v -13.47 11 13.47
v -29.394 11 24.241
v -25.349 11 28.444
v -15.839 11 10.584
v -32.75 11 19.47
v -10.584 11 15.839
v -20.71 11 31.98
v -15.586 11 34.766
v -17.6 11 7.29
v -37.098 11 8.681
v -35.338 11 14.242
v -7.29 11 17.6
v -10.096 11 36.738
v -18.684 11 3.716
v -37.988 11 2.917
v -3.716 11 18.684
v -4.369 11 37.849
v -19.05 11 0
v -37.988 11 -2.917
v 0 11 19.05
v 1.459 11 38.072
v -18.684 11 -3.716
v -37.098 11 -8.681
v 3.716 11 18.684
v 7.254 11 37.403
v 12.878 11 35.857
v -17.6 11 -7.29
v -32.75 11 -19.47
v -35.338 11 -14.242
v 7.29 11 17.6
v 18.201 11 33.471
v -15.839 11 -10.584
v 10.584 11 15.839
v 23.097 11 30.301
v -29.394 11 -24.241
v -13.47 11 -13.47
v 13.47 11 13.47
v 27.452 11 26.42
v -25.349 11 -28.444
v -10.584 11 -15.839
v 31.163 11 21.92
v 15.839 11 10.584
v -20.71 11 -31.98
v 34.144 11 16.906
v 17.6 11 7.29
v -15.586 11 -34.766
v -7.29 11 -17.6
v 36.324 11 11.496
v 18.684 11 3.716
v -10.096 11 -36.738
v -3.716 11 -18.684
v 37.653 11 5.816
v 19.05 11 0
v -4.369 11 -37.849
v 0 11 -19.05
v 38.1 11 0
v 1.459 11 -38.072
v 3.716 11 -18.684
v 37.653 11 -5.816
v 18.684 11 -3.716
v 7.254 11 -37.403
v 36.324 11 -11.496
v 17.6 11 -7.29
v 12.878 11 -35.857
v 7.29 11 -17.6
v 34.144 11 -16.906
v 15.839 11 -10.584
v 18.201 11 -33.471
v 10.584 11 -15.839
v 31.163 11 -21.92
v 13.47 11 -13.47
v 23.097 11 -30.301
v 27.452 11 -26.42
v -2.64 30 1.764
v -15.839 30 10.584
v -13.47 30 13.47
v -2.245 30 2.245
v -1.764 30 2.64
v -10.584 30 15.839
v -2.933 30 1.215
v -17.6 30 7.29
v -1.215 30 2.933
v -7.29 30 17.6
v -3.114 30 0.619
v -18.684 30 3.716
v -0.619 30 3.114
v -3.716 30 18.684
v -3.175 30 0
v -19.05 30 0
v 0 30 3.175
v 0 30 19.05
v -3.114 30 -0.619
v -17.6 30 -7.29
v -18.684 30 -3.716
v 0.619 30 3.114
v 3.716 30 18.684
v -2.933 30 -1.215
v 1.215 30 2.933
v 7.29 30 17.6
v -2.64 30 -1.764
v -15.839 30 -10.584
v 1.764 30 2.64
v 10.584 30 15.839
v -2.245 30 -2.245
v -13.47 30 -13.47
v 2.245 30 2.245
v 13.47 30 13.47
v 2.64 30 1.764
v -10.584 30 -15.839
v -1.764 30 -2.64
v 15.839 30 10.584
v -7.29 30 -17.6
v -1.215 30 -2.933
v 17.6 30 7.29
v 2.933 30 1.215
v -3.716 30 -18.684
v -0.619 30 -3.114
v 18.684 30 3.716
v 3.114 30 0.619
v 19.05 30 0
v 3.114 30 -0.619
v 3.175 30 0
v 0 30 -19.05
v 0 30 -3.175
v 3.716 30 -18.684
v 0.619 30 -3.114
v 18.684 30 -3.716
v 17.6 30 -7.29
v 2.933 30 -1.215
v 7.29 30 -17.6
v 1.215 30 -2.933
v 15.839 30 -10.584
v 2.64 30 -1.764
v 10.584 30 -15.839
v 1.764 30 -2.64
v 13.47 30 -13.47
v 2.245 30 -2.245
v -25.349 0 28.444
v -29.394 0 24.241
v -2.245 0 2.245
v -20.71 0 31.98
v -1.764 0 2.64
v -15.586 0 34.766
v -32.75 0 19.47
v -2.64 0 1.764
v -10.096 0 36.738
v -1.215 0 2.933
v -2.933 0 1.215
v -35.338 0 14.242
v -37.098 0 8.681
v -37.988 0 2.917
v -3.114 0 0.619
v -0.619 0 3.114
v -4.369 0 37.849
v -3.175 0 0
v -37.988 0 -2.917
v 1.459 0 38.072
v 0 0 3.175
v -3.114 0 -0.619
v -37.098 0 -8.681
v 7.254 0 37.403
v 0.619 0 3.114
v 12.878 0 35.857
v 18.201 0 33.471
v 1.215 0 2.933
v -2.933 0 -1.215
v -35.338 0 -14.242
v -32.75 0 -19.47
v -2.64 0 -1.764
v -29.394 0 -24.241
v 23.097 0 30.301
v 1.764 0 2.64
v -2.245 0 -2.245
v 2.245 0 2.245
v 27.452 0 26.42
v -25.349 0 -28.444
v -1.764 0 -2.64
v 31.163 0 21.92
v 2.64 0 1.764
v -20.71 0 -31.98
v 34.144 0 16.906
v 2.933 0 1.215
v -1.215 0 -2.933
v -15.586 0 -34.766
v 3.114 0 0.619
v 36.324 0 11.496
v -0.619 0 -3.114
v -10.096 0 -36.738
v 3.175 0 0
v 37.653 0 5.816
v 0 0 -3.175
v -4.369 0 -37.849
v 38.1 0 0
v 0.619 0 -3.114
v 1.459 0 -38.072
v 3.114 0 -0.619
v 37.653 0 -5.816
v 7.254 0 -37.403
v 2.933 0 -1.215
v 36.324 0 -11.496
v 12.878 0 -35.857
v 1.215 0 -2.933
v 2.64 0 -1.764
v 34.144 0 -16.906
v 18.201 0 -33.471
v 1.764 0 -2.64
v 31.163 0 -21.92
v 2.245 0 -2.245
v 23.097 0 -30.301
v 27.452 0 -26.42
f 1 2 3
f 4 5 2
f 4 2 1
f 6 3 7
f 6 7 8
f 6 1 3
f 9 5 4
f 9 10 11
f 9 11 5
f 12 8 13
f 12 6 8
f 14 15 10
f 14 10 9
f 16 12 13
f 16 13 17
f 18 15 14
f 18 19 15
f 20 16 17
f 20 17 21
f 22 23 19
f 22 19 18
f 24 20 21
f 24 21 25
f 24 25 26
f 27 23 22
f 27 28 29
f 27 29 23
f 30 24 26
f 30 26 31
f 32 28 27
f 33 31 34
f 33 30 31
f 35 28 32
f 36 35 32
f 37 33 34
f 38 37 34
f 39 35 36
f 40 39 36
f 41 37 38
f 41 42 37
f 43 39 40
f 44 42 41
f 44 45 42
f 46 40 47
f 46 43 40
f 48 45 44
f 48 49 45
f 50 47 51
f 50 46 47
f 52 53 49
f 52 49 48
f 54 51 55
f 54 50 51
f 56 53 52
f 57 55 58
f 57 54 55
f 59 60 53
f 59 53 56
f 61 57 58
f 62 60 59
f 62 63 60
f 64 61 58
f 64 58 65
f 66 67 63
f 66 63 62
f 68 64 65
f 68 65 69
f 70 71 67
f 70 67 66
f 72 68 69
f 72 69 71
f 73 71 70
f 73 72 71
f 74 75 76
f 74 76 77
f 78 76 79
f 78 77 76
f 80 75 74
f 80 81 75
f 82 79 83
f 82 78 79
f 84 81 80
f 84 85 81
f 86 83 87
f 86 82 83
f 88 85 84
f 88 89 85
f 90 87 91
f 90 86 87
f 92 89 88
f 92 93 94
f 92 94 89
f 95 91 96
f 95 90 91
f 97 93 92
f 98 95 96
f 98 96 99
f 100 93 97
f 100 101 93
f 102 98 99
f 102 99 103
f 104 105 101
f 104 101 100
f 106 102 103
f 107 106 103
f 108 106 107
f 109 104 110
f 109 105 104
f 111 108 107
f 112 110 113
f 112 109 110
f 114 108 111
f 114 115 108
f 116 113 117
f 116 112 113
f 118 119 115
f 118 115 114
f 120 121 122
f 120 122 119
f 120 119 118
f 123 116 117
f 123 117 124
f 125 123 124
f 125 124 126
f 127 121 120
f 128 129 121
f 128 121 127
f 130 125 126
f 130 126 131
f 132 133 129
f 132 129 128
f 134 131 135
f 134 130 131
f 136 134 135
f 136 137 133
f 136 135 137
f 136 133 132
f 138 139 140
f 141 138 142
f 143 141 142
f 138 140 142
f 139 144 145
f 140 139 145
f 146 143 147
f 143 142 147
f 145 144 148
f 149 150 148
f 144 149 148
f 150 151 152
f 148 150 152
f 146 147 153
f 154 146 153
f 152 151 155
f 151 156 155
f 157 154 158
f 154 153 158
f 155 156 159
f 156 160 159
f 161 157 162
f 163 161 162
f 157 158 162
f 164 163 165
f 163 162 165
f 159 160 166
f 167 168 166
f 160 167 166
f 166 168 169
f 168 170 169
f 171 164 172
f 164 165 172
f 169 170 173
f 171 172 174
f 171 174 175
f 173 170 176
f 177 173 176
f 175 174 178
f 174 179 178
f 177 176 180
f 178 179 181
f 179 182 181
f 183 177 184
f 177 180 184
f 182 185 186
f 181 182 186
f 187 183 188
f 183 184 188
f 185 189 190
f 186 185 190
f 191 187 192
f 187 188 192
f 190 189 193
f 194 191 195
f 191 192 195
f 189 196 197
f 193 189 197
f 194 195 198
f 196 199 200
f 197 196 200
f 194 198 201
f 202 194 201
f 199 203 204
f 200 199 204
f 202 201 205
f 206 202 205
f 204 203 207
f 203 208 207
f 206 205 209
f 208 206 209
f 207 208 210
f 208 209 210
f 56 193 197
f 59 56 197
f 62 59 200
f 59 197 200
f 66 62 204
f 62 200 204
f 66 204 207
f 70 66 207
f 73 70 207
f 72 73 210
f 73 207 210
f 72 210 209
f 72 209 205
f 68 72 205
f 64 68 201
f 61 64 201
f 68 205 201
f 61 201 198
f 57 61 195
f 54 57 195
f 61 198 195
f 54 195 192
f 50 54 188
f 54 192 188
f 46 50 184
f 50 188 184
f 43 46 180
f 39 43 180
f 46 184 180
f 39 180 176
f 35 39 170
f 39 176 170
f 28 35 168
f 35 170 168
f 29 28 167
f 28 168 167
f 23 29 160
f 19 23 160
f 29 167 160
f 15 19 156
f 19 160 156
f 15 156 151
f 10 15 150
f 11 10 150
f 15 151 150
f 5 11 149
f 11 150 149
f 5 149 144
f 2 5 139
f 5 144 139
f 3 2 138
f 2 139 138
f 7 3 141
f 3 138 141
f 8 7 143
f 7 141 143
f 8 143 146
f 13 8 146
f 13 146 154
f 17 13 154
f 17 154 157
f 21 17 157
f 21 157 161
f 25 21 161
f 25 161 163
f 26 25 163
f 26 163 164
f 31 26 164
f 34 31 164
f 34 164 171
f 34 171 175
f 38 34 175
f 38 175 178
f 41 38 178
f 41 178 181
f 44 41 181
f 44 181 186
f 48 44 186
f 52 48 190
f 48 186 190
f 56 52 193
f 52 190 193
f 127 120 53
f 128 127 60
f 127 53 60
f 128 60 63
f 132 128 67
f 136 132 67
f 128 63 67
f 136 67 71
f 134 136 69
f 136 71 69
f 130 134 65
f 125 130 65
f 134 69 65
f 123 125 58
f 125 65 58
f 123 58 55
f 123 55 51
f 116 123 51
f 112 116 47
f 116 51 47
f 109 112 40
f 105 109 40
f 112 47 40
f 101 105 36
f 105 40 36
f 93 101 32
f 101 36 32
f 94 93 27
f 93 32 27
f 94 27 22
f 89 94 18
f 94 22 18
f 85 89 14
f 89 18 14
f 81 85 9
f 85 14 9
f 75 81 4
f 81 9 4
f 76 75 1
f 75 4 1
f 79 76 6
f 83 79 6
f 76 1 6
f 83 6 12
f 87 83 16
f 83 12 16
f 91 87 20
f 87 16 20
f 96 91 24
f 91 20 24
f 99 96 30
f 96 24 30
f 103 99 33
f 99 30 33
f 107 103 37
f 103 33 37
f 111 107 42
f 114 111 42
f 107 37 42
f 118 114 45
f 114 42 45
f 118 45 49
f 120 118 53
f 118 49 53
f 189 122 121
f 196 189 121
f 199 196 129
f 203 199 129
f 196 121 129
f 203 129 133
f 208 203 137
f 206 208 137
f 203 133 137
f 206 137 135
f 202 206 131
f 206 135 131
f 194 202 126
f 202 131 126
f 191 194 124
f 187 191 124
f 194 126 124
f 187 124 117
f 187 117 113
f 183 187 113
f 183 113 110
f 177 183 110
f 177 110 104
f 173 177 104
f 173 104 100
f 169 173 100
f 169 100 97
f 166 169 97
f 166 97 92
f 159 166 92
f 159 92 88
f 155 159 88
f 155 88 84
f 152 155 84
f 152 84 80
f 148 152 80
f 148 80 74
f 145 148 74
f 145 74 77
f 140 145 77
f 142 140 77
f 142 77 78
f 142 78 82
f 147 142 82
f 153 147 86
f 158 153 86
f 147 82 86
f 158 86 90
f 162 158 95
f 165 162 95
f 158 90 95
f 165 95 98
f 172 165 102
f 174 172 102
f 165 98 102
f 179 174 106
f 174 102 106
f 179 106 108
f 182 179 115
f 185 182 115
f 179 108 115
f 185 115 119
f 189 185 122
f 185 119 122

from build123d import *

# Parameters (mm, degrees)
ESQUISSE1_R             = 38.1
BOSS_EXTRU_1_DEPTH      = 11
ESQUISSE2_R             = 19.05
BOSS_EXTRU_2_DEPTH      = 19
ESQUISSE3_R             = 3.175
ENL_V_MAT_EXTRU_1_DEPTH = 31


with BuildPart() as part:
    # Esquisse1 → Boss.-Extru.1 (new body)
    with BuildSketch(Plane(origin=(0, 0, 0), x_dir=(1, 0, 0), z_dir=(0, 1, 0))):
        Circle(ESQUISSE1_R)
    extrude(amount=BOSS_EXTRU_1_DEPTH)

    # Esquisse2 → Boss.-Extru.2 (add)
    with BuildSketch(Plane(origin=(0, 11, 0), x_dir=(1, 0, 0), z_dir=(0, 1, 0))):
        Circle(ESQUISSE2_R)
    extrude(amount=BOSS_EXTRU_2_DEPTH)

    # Esquisse3 → Enlèv. mat.-Extru.1 (cut, through all)
    with BuildSketch(Plane(origin=(0, 30, 0), x_dir=(1, 0, 0), z_dir=(0, 1, 0))):
        Circle(ESQUISSE3_R)
    extrude(amount=-ENL_V_MAT_EXTRU_1_DEPTH, mode=Mode.SUBTRACT)


solid = part.part
